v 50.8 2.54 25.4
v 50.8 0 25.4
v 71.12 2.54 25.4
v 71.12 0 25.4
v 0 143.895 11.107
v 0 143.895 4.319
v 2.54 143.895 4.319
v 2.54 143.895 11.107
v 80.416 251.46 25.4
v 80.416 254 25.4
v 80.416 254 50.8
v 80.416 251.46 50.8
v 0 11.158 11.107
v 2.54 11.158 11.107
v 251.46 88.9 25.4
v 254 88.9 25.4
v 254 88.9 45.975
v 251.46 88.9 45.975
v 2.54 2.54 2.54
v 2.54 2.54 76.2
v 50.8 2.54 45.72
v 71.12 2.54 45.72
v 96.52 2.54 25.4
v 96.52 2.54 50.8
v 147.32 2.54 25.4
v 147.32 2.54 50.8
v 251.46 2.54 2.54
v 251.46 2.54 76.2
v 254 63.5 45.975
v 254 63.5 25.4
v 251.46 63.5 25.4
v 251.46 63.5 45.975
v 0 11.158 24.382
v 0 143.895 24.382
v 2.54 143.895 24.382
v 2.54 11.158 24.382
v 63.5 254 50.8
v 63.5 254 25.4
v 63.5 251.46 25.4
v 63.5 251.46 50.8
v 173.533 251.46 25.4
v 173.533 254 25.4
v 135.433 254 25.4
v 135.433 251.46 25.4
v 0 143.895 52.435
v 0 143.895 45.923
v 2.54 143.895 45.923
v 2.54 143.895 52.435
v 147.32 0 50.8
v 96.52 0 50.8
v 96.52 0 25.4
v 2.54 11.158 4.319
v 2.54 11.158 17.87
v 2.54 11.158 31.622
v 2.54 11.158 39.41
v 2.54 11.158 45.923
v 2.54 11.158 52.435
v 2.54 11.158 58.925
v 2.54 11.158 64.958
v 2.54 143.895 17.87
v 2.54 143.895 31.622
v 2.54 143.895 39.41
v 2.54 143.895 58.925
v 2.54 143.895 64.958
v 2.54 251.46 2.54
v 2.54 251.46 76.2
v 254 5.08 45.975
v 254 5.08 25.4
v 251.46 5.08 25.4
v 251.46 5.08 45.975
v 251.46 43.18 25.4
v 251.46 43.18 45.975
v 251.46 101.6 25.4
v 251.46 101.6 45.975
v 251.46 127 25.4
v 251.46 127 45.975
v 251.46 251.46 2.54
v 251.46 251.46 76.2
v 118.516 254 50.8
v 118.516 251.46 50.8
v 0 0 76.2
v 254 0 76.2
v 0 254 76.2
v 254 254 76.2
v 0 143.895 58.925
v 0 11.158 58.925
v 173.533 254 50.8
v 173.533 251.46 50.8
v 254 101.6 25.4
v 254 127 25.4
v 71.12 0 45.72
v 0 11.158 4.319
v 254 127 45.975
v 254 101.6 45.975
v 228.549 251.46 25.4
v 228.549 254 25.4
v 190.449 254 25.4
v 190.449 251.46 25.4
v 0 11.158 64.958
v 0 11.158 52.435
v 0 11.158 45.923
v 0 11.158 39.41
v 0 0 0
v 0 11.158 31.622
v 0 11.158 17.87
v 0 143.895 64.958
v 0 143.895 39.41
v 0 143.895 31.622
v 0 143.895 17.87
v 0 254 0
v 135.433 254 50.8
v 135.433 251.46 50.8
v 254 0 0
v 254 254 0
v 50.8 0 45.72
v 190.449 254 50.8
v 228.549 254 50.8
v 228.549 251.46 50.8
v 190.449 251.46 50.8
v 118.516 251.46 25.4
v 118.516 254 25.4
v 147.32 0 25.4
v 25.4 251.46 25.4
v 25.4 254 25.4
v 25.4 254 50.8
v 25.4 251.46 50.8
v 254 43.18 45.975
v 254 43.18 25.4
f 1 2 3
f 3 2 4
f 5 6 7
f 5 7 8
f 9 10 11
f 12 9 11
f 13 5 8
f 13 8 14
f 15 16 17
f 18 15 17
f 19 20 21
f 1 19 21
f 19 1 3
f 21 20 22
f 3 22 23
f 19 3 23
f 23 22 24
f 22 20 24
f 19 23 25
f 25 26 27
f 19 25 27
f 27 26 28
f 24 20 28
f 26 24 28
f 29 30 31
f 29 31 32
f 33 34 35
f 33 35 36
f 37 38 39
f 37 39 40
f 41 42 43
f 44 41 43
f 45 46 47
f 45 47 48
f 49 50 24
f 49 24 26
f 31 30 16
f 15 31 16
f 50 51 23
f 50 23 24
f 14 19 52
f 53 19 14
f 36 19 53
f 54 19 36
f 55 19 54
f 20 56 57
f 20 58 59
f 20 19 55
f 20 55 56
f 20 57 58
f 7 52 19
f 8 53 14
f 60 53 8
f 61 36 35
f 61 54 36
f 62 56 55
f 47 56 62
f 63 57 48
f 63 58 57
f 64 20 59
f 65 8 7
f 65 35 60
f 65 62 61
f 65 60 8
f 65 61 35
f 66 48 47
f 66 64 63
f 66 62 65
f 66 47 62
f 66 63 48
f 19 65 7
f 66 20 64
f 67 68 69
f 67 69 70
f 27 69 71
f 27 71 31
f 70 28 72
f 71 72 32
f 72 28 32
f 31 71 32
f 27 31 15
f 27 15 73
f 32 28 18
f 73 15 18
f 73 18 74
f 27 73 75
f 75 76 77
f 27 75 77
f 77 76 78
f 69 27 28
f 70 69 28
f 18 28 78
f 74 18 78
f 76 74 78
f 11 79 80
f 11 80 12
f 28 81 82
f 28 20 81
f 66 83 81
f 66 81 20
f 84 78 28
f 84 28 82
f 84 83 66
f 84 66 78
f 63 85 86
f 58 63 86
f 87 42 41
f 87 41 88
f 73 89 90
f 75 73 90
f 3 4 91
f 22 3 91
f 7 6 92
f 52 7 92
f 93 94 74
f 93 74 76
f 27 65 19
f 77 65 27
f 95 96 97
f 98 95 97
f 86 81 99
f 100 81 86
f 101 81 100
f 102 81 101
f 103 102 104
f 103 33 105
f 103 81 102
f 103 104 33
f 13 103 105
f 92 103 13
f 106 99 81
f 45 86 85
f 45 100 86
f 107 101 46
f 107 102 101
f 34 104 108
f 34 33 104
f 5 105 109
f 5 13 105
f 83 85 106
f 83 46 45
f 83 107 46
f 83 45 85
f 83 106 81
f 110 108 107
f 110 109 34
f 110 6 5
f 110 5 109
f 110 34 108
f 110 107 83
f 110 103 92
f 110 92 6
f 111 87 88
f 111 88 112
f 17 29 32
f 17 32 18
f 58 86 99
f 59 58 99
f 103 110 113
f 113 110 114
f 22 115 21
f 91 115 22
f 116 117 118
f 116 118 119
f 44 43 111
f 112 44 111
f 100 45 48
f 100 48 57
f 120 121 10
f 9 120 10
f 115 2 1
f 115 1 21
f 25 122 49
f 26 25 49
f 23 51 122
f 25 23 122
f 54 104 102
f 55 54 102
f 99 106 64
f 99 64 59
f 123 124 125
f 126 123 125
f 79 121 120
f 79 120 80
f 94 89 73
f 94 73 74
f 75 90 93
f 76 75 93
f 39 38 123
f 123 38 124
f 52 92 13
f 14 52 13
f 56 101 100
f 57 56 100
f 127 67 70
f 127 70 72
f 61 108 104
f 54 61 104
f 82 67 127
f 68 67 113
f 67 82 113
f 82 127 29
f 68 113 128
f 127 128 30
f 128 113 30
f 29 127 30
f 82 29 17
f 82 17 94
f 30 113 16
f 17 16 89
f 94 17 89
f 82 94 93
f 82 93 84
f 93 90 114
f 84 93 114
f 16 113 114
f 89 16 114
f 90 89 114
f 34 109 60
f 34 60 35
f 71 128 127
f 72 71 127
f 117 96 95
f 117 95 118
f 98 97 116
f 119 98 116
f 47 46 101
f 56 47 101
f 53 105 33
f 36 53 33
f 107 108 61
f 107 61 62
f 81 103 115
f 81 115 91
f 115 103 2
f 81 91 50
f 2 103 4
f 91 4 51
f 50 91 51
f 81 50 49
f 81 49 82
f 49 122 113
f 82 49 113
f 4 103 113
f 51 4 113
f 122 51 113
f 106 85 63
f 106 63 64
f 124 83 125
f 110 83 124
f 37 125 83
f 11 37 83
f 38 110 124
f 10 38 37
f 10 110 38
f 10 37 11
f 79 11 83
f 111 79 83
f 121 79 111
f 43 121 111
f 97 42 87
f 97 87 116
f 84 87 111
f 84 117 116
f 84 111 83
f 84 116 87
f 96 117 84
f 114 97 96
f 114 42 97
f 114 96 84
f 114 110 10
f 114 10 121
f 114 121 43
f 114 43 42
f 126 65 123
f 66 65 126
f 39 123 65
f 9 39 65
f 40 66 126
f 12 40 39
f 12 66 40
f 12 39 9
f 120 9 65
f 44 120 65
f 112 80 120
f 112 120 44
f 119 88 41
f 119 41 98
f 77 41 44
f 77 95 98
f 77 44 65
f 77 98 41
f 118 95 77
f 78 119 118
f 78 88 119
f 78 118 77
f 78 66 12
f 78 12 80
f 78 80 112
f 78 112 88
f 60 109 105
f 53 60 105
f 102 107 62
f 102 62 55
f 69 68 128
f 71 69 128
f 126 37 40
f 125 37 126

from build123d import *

# Parameters (mm, degrees)
F0_W      = 254
F0_H      = 254
F1_DEPTH  = 76.2
F2_W      = 248.92
F2_H      = 248.92
F3_DEPTH  = 73.66
F4_W      = 38.1
F4_H      = 25.4
F5_DEPTH  = 25.4
F6_W      = 38.1
F6_H      = 20.575085
F6_W_2    = 25.4
F7_DEPTH  = 25.4
F8_W      = 20.32
F8_H      = 20.32
F8_W_2    = 50.8
F8_H_2    = 25.4
F9_DEPTH  = 25.4
F10_W     = 132.736489
F10_H     = 6.033477
F10_H_2   = 6.512225
F10_H_3   = 7.788459
F10_H_4   = 6.512222
F10_H_5   = 6.788271
F11_DEPTH = 25.4


with BuildPart() as f1:
    # F0 (on Top) → F1 (new body)
    with BuildSketch(Plane.XY):
        with Locations((127, 127)):
            Rectangle(F0_W, F0_H)
    extrude(amount=F1_DEPTH)

    # F2 (on face) → F3 (cut)
    with BuildSketch(Plane.XY.offset(76.2)):
        with Locations((127, 127)):
            Rectangle(F2_W, F2_H)
    extrude(amount=-F3_DEPTH, mode=Mode.SUBTRACT)

    # F4 (on face) → F5 (cut)
    with BuildSketch(Plane(origin=(0, 254, 0), x_dir=(-1, 0, 0), z_dir=(0, 1, 0))):
        with Locations((-209.4992, 38.1)):
            Rectangle(F4_W, F4_H)
        with Locations((-154.4828, 38.1)):
            Rectangle(F4_W, F4_H)
        with Locations((-99.4664, 38.1)):
            Rectangle(F4_W, F4_H)
        with Locations((-44.45, 38.1)):
            Rectangle(F4_W, F4_H)
    extrude(amount=-F5_DEPTH, mode=Mode.SUBTRACT)

    # F6 (on face) → F7 (cut)
    with BuildSketch(Plane.YZ.offset(254)):
        with Locations((24.13, 35.687542)):
            Rectangle(F6_W, F6_H)
        with Locations((76.2, 35.687542)):
            Rectangle(F6_W_2, F6_H)
        with Locations((114.3, 35.687542)):
            Rectangle(F6_W_2, F6_H)
    extrude(amount=-F7_DEPTH, mode=Mode.SUBTRACT)

    # F8 (on face) → F9 (cut)
    with BuildSketch(Plane.XZ):
        with Locations((60.96, 35.56)):
            Rectangle(F8_W, F8_H)
        with Locations((121.92, 38.1)):
            Rectangle(F8_W_2, F8_H_2)
    extrude(amount=-F9_DEPTH, mode=Mode.SUBTRACT)

    # F10 (on face) → F11 (cut)
    with BuildSketch(Plane(origin=(0, 0, 0), x_dir=(0, -1, 0), z_dir=(-1, 0, 0))):
        with Locations((-77.526577, 61.941588)):
            Rectangle(F10_W, F10_H)
        with Locations((-77.526577, 49.178708)):
            Rectangle(F10_W, F10_H_2)
        with Locations((-77.526577, 35.516145)):
            Rectangle(F10_W, F10_H_3)
        with Locations((-77.526577, 21.126057)):
            Rectangle(F10_W, F10_H_4)
        with Locations((-77.526577, 7.713118)):
            Rectangle(F10_W, F10_H_5)
    extrude(amount=-F11_DEPTH, mode=Mode.SUBTRACT)


solid = f1.part
